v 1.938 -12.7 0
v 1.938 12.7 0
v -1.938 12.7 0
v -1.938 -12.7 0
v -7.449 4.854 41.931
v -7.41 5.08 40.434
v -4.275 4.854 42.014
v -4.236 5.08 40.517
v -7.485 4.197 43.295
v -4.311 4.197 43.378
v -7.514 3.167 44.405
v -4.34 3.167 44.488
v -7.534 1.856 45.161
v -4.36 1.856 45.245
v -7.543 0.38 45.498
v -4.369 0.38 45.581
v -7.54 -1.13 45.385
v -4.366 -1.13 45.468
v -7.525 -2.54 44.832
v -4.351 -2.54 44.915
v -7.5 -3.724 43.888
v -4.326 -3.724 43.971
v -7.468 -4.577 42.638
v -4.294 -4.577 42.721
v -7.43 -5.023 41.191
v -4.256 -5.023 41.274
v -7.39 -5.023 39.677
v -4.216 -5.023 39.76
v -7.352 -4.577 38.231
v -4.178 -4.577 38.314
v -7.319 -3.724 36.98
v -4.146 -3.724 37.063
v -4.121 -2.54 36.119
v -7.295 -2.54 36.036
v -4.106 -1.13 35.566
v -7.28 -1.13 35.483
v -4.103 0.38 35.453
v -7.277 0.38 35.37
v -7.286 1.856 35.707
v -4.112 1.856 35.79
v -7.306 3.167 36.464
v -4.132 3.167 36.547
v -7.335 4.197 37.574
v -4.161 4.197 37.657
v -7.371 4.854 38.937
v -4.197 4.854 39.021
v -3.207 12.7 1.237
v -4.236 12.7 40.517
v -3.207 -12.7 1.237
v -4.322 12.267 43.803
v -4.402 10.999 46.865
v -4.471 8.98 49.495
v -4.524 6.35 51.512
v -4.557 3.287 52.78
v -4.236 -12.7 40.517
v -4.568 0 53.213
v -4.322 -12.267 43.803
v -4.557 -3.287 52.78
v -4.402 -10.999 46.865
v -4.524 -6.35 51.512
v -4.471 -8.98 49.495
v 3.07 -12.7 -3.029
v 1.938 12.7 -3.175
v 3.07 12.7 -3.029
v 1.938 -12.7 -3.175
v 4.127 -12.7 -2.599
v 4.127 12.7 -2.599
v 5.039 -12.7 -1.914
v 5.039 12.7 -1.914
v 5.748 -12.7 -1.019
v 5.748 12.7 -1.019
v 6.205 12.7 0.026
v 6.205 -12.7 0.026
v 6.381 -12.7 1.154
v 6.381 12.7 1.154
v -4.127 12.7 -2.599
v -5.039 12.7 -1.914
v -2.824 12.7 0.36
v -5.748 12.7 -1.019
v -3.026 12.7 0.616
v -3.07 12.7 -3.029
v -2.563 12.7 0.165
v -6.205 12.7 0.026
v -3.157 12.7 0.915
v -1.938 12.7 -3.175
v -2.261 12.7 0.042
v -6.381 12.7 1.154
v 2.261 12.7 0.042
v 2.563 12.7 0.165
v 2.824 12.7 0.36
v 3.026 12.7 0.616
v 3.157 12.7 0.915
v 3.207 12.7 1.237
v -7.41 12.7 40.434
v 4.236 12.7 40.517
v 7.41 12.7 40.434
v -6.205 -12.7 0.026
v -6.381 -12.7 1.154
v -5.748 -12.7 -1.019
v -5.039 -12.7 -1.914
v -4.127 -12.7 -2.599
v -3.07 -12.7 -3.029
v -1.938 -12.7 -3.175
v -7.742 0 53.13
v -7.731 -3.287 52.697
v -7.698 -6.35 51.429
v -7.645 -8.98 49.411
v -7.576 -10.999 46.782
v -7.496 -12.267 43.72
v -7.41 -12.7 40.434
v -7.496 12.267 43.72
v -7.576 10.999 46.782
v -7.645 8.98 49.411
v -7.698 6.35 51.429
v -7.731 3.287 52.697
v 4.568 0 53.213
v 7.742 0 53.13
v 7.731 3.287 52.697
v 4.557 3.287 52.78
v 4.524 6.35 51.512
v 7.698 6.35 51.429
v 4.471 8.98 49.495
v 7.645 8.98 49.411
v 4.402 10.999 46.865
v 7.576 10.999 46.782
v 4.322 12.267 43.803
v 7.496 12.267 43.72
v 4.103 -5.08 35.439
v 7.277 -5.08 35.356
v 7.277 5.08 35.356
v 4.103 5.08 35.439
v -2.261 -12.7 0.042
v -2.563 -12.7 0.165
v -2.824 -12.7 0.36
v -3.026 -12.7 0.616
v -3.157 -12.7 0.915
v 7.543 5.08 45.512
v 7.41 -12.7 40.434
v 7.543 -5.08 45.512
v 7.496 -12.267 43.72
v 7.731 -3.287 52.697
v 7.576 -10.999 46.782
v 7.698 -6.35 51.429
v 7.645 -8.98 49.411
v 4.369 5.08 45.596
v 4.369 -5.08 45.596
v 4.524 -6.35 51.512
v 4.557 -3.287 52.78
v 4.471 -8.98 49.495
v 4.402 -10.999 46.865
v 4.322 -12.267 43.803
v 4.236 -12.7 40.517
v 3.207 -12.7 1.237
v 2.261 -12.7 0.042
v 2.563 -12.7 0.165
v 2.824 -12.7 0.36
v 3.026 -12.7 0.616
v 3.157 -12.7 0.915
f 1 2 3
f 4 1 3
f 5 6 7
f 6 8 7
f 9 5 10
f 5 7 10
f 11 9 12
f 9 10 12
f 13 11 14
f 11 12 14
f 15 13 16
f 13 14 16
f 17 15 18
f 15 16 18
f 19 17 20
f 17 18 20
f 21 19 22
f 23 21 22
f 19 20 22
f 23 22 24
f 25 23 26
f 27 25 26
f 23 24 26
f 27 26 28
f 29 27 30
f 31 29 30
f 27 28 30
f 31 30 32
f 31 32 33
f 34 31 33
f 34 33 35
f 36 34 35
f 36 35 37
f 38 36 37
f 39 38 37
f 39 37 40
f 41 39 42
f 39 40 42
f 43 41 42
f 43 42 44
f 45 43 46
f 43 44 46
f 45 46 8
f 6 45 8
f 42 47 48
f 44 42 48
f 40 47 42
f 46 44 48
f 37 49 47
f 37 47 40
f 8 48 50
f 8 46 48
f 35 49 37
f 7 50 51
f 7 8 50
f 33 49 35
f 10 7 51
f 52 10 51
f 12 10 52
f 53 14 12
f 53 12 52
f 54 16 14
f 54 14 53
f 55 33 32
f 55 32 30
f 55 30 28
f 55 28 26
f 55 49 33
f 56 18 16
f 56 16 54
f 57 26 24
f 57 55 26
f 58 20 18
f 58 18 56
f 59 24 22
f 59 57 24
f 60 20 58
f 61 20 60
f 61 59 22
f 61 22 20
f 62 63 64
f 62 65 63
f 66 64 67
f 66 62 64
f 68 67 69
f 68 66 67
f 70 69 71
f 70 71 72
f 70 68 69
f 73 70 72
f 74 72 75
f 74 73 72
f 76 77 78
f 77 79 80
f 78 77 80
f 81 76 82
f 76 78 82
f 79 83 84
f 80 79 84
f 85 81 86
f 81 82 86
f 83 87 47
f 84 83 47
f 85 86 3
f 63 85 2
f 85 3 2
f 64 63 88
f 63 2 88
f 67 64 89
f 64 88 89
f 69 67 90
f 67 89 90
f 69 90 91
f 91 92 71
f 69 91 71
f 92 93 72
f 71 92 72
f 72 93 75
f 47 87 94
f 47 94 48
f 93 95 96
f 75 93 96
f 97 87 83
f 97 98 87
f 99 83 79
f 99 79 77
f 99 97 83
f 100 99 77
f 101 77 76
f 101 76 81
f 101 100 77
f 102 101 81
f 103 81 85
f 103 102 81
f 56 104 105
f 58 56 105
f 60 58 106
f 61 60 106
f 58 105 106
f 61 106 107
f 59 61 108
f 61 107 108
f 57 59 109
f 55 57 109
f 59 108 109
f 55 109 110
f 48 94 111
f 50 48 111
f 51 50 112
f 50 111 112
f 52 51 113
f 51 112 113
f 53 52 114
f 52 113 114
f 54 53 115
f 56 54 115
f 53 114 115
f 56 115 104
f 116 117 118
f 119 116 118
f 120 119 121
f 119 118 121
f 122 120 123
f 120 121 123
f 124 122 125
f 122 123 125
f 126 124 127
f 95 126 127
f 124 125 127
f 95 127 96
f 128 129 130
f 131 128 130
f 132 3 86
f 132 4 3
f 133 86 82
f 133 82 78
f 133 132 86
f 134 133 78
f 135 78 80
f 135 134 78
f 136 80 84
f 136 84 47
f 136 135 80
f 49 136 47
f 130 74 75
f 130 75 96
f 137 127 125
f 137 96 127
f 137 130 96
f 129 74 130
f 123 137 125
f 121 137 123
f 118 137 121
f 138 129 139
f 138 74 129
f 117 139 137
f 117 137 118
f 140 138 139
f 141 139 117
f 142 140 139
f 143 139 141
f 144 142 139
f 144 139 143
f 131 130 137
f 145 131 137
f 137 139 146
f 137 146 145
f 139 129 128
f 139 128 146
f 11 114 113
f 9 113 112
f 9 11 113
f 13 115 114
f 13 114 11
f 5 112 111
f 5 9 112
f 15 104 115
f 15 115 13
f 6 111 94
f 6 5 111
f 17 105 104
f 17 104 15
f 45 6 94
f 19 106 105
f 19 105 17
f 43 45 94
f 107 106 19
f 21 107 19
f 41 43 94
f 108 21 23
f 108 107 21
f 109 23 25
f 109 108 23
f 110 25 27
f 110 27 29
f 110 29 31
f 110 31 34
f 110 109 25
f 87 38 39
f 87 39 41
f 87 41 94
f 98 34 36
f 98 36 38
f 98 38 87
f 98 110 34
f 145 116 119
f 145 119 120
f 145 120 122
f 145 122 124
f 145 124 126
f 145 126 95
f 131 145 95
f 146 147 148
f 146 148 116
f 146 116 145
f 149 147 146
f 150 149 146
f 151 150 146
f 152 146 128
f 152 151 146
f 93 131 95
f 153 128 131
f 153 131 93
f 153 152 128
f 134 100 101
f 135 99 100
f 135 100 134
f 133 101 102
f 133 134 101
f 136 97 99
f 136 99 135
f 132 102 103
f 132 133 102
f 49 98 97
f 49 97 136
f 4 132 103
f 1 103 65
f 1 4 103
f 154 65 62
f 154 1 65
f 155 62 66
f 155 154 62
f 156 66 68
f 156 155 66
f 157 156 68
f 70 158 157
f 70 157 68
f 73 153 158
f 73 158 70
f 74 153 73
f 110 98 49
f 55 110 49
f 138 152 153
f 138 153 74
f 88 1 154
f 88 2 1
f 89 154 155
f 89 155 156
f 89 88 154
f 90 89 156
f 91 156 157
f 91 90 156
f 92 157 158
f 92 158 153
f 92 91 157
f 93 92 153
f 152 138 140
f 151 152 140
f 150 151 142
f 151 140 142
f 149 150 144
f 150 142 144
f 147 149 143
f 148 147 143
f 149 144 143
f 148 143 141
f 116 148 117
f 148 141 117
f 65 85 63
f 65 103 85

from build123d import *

# Parameters (mm, degrees)
F1_DEPTH      = 12.7
F1_DEPTH_BACK = 12.7
F2_W          = 10.16
F2_H          = 10.16
F3_DEPTH      = 3.175
F5_DEPTH      = 3.175
F6_R          = 1.27
F7_R          = 4.445
F8_D          = 10.16
F8_DEPTH      = 3.175
F8_TIP        = 3.0523719447


with BuildPart() as f1:
    # F0 (on Front) → F1 (new body, two sides)
    with BuildSketch(Plane.XZ) as f1_sk:
        Polygon((3.175, 0), (-3.175, 0), (-4.5684314445, 53.213), (-7.7423434513, 53.1298881891), (-6.2679480652, -3.175), (6.2679480652, -3.175), (7.7423434513, 53.1298881891), (4.5684314445, 53.213), align=None)
    extrude(amount=F1_DEPTH)
    extrude(f1_sk.sketch, amount=-F1_DEPTH_BACK)

    # F2 (on face) → F3 (cut, through all)
    with BuildSketch(Plane(origin=(6.3467363932, 0, -0.1661951414), x_dir=(0, 1, 0), z_dir=(0.999657325, 0, -0.0261769483))):
        with BuildLine():
            ThreePointArc((-12.7, 40.6143528277), (-8.9802561276, 49.5946089422), (-1.86e-08, 53.3143528277))
            Line((-1.86e-08, 53.3143528277), (-12.7, 53.3143528277))
            Line((-12.7, 53.3143528277), (-12.7, 40.6143528277))
        make_face()
        with BuildLine():
            ThreePointArc((-1.86e-08, 53.3143528277), (8.9802561145, 49.5946089553), (12.7, 40.6143528277))
            Line((12.7, 40.6143528277), (12.7, 53.3143528277))
            Line((12.7, 53.3143528277), (-1.86e-08, 53.3143528277))
        make_face()
        with Locations((0, 40.6143528277)):
            Rectangle(F2_W, F2_H)
    extrude(amount=-F3_DEPTH, mode=Mode.SUBTRACT)

    # F4 (on face) → F5 (cut, through all)
    with BuildSketch(Plane(origin=(-6.3467363932, 0, -0.1661951414), x_dir=(0, -1, 0), z_dir=(-0.999657325, 0, -0.0261769483))):
        with BuildLine():
            ThreePointArc((-12.7, 40.6143528277), (-8.9802561029, 49.594608967), (5.15e-08, 53.3143528277))
            Line((5.15e-08, 53.3143528277), (-12.7, 53.3143528277))
            Line((-12.7, 53.3143528277), (-12.7, 40.6143528277))
        make_face()
        with BuildLine():
            ThreePointArc((5.15e-08, 53.3143528277), (8.9802561393, 49.5946089305), (12.7, 40.6143528277))
            Line((12.7, 40.6143528277), (12.7, 53.3143528277))
            Line((12.7, 53.3143528277), (5.15e-08, 53.3143528277))
        make_face()
    extrude(amount=-F5_DEPTH, mode=Mode.SUBTRACT)

    # F6
    f6_edges = [f1.edges().sort_by_distance(p)[0] for p in [
        (3.175, 0, 0),
        (-3.175, 0, 0),
    ]]
    fillet(f6_edges, radius=F6_R)

    # F7
    f7_edges = [f1.edges().sort_by_distance(p)[0] for p in [
        (6.267948, 0, -3.175),
        (-6.267948, 0, -3.175),
    ]]
    fillet(f7_edges, radius=F7_R)

    # F8
    with Locations(Plane(origin=(-6.3467363932, 0, -0.1661951414), x_dir=(0, -1, 0), z_dir=(-0.999657325, 0, -0.0261769483))):
        with Locations((0, 40.6143528277)):
            Hole(F8_D / 2, depth=F8_DEPTH)
            with Locations((0, 0, -(F8_DEPTH + F8_TIP / 2))):  # 118° drill point
                Cone(0, F8_D / 2, F8_TIP, mode=Mode.SUBTRACT)


solid = f1.part
